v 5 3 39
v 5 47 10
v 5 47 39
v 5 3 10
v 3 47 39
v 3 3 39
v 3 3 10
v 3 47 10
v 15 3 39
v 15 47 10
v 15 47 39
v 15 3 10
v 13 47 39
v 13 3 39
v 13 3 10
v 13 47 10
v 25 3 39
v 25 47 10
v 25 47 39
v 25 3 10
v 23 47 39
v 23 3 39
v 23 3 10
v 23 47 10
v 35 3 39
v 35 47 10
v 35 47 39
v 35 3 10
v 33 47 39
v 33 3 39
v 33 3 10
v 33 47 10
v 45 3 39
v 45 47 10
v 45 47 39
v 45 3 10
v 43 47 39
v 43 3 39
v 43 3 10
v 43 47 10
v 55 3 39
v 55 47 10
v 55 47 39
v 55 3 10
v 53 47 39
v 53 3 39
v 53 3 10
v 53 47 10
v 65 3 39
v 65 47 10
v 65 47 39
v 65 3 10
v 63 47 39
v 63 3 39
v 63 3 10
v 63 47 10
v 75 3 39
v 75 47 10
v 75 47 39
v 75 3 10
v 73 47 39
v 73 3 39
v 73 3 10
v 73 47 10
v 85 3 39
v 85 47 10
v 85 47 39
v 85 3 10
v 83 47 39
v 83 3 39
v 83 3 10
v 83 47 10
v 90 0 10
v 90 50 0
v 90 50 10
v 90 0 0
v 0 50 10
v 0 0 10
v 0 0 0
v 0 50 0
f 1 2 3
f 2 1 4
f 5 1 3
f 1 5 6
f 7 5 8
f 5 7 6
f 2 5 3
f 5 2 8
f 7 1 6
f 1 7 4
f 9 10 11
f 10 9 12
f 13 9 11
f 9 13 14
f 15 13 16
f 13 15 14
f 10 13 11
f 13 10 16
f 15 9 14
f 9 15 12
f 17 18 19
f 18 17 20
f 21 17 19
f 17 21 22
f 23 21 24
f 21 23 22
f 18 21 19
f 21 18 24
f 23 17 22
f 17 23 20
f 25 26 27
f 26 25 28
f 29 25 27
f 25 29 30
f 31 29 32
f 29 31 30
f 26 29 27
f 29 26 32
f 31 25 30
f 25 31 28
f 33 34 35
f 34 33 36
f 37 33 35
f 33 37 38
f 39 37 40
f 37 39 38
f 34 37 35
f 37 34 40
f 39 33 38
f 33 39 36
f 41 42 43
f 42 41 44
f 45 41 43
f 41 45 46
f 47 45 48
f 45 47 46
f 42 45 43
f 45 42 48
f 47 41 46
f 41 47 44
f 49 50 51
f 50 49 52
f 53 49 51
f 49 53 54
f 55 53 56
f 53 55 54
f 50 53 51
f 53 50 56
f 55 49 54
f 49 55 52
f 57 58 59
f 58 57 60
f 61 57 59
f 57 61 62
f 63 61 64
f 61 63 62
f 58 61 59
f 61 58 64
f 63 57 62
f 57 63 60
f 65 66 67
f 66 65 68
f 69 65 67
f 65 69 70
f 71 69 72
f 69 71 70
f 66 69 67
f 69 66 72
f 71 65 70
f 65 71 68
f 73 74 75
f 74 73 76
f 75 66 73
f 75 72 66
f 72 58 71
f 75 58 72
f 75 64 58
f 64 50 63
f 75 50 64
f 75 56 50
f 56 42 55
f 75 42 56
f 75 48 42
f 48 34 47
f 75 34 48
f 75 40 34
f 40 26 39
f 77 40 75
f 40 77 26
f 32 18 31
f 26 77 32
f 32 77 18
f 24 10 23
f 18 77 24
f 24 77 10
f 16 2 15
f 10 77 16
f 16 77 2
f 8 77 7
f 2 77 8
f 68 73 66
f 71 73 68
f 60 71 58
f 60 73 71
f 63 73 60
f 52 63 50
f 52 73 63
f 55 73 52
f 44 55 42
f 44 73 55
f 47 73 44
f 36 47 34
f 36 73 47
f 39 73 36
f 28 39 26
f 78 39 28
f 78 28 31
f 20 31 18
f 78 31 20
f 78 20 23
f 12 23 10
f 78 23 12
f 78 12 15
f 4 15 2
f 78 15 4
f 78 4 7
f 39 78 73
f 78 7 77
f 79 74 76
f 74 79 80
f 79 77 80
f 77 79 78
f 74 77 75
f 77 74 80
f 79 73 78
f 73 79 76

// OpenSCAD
$fn = 32;

// ----------------------------------------------------------------------
// Heatsink: uniform fin block
// ----------------------------------------------------------------------

// --- parameters (mm) ---
base_l = 90;              // base length, X
base_w = 50;              // base width, Y
base_t = 10;              // base plate thickness
fin_h = 30;               // fin height above the base
fin_t = 2;                // fin thickness
edge = 3;                 // margin from the base ends
pitch = 10;               // fin pitch

n_fins = floor((base_l - 2 * edge - fin_t) / pitch) + 1;  // fin count
total_h = base_t + fin_h - 1;  // overall height

union() {
  cube([base_l, base_w, base_t]);
  for (i = [0 : n_fins - 1])
    translate([edge + i * pitch, edge, base_t - 1])
      cube([fin_t, base_w - 2 * edge, fin_h]);
}
